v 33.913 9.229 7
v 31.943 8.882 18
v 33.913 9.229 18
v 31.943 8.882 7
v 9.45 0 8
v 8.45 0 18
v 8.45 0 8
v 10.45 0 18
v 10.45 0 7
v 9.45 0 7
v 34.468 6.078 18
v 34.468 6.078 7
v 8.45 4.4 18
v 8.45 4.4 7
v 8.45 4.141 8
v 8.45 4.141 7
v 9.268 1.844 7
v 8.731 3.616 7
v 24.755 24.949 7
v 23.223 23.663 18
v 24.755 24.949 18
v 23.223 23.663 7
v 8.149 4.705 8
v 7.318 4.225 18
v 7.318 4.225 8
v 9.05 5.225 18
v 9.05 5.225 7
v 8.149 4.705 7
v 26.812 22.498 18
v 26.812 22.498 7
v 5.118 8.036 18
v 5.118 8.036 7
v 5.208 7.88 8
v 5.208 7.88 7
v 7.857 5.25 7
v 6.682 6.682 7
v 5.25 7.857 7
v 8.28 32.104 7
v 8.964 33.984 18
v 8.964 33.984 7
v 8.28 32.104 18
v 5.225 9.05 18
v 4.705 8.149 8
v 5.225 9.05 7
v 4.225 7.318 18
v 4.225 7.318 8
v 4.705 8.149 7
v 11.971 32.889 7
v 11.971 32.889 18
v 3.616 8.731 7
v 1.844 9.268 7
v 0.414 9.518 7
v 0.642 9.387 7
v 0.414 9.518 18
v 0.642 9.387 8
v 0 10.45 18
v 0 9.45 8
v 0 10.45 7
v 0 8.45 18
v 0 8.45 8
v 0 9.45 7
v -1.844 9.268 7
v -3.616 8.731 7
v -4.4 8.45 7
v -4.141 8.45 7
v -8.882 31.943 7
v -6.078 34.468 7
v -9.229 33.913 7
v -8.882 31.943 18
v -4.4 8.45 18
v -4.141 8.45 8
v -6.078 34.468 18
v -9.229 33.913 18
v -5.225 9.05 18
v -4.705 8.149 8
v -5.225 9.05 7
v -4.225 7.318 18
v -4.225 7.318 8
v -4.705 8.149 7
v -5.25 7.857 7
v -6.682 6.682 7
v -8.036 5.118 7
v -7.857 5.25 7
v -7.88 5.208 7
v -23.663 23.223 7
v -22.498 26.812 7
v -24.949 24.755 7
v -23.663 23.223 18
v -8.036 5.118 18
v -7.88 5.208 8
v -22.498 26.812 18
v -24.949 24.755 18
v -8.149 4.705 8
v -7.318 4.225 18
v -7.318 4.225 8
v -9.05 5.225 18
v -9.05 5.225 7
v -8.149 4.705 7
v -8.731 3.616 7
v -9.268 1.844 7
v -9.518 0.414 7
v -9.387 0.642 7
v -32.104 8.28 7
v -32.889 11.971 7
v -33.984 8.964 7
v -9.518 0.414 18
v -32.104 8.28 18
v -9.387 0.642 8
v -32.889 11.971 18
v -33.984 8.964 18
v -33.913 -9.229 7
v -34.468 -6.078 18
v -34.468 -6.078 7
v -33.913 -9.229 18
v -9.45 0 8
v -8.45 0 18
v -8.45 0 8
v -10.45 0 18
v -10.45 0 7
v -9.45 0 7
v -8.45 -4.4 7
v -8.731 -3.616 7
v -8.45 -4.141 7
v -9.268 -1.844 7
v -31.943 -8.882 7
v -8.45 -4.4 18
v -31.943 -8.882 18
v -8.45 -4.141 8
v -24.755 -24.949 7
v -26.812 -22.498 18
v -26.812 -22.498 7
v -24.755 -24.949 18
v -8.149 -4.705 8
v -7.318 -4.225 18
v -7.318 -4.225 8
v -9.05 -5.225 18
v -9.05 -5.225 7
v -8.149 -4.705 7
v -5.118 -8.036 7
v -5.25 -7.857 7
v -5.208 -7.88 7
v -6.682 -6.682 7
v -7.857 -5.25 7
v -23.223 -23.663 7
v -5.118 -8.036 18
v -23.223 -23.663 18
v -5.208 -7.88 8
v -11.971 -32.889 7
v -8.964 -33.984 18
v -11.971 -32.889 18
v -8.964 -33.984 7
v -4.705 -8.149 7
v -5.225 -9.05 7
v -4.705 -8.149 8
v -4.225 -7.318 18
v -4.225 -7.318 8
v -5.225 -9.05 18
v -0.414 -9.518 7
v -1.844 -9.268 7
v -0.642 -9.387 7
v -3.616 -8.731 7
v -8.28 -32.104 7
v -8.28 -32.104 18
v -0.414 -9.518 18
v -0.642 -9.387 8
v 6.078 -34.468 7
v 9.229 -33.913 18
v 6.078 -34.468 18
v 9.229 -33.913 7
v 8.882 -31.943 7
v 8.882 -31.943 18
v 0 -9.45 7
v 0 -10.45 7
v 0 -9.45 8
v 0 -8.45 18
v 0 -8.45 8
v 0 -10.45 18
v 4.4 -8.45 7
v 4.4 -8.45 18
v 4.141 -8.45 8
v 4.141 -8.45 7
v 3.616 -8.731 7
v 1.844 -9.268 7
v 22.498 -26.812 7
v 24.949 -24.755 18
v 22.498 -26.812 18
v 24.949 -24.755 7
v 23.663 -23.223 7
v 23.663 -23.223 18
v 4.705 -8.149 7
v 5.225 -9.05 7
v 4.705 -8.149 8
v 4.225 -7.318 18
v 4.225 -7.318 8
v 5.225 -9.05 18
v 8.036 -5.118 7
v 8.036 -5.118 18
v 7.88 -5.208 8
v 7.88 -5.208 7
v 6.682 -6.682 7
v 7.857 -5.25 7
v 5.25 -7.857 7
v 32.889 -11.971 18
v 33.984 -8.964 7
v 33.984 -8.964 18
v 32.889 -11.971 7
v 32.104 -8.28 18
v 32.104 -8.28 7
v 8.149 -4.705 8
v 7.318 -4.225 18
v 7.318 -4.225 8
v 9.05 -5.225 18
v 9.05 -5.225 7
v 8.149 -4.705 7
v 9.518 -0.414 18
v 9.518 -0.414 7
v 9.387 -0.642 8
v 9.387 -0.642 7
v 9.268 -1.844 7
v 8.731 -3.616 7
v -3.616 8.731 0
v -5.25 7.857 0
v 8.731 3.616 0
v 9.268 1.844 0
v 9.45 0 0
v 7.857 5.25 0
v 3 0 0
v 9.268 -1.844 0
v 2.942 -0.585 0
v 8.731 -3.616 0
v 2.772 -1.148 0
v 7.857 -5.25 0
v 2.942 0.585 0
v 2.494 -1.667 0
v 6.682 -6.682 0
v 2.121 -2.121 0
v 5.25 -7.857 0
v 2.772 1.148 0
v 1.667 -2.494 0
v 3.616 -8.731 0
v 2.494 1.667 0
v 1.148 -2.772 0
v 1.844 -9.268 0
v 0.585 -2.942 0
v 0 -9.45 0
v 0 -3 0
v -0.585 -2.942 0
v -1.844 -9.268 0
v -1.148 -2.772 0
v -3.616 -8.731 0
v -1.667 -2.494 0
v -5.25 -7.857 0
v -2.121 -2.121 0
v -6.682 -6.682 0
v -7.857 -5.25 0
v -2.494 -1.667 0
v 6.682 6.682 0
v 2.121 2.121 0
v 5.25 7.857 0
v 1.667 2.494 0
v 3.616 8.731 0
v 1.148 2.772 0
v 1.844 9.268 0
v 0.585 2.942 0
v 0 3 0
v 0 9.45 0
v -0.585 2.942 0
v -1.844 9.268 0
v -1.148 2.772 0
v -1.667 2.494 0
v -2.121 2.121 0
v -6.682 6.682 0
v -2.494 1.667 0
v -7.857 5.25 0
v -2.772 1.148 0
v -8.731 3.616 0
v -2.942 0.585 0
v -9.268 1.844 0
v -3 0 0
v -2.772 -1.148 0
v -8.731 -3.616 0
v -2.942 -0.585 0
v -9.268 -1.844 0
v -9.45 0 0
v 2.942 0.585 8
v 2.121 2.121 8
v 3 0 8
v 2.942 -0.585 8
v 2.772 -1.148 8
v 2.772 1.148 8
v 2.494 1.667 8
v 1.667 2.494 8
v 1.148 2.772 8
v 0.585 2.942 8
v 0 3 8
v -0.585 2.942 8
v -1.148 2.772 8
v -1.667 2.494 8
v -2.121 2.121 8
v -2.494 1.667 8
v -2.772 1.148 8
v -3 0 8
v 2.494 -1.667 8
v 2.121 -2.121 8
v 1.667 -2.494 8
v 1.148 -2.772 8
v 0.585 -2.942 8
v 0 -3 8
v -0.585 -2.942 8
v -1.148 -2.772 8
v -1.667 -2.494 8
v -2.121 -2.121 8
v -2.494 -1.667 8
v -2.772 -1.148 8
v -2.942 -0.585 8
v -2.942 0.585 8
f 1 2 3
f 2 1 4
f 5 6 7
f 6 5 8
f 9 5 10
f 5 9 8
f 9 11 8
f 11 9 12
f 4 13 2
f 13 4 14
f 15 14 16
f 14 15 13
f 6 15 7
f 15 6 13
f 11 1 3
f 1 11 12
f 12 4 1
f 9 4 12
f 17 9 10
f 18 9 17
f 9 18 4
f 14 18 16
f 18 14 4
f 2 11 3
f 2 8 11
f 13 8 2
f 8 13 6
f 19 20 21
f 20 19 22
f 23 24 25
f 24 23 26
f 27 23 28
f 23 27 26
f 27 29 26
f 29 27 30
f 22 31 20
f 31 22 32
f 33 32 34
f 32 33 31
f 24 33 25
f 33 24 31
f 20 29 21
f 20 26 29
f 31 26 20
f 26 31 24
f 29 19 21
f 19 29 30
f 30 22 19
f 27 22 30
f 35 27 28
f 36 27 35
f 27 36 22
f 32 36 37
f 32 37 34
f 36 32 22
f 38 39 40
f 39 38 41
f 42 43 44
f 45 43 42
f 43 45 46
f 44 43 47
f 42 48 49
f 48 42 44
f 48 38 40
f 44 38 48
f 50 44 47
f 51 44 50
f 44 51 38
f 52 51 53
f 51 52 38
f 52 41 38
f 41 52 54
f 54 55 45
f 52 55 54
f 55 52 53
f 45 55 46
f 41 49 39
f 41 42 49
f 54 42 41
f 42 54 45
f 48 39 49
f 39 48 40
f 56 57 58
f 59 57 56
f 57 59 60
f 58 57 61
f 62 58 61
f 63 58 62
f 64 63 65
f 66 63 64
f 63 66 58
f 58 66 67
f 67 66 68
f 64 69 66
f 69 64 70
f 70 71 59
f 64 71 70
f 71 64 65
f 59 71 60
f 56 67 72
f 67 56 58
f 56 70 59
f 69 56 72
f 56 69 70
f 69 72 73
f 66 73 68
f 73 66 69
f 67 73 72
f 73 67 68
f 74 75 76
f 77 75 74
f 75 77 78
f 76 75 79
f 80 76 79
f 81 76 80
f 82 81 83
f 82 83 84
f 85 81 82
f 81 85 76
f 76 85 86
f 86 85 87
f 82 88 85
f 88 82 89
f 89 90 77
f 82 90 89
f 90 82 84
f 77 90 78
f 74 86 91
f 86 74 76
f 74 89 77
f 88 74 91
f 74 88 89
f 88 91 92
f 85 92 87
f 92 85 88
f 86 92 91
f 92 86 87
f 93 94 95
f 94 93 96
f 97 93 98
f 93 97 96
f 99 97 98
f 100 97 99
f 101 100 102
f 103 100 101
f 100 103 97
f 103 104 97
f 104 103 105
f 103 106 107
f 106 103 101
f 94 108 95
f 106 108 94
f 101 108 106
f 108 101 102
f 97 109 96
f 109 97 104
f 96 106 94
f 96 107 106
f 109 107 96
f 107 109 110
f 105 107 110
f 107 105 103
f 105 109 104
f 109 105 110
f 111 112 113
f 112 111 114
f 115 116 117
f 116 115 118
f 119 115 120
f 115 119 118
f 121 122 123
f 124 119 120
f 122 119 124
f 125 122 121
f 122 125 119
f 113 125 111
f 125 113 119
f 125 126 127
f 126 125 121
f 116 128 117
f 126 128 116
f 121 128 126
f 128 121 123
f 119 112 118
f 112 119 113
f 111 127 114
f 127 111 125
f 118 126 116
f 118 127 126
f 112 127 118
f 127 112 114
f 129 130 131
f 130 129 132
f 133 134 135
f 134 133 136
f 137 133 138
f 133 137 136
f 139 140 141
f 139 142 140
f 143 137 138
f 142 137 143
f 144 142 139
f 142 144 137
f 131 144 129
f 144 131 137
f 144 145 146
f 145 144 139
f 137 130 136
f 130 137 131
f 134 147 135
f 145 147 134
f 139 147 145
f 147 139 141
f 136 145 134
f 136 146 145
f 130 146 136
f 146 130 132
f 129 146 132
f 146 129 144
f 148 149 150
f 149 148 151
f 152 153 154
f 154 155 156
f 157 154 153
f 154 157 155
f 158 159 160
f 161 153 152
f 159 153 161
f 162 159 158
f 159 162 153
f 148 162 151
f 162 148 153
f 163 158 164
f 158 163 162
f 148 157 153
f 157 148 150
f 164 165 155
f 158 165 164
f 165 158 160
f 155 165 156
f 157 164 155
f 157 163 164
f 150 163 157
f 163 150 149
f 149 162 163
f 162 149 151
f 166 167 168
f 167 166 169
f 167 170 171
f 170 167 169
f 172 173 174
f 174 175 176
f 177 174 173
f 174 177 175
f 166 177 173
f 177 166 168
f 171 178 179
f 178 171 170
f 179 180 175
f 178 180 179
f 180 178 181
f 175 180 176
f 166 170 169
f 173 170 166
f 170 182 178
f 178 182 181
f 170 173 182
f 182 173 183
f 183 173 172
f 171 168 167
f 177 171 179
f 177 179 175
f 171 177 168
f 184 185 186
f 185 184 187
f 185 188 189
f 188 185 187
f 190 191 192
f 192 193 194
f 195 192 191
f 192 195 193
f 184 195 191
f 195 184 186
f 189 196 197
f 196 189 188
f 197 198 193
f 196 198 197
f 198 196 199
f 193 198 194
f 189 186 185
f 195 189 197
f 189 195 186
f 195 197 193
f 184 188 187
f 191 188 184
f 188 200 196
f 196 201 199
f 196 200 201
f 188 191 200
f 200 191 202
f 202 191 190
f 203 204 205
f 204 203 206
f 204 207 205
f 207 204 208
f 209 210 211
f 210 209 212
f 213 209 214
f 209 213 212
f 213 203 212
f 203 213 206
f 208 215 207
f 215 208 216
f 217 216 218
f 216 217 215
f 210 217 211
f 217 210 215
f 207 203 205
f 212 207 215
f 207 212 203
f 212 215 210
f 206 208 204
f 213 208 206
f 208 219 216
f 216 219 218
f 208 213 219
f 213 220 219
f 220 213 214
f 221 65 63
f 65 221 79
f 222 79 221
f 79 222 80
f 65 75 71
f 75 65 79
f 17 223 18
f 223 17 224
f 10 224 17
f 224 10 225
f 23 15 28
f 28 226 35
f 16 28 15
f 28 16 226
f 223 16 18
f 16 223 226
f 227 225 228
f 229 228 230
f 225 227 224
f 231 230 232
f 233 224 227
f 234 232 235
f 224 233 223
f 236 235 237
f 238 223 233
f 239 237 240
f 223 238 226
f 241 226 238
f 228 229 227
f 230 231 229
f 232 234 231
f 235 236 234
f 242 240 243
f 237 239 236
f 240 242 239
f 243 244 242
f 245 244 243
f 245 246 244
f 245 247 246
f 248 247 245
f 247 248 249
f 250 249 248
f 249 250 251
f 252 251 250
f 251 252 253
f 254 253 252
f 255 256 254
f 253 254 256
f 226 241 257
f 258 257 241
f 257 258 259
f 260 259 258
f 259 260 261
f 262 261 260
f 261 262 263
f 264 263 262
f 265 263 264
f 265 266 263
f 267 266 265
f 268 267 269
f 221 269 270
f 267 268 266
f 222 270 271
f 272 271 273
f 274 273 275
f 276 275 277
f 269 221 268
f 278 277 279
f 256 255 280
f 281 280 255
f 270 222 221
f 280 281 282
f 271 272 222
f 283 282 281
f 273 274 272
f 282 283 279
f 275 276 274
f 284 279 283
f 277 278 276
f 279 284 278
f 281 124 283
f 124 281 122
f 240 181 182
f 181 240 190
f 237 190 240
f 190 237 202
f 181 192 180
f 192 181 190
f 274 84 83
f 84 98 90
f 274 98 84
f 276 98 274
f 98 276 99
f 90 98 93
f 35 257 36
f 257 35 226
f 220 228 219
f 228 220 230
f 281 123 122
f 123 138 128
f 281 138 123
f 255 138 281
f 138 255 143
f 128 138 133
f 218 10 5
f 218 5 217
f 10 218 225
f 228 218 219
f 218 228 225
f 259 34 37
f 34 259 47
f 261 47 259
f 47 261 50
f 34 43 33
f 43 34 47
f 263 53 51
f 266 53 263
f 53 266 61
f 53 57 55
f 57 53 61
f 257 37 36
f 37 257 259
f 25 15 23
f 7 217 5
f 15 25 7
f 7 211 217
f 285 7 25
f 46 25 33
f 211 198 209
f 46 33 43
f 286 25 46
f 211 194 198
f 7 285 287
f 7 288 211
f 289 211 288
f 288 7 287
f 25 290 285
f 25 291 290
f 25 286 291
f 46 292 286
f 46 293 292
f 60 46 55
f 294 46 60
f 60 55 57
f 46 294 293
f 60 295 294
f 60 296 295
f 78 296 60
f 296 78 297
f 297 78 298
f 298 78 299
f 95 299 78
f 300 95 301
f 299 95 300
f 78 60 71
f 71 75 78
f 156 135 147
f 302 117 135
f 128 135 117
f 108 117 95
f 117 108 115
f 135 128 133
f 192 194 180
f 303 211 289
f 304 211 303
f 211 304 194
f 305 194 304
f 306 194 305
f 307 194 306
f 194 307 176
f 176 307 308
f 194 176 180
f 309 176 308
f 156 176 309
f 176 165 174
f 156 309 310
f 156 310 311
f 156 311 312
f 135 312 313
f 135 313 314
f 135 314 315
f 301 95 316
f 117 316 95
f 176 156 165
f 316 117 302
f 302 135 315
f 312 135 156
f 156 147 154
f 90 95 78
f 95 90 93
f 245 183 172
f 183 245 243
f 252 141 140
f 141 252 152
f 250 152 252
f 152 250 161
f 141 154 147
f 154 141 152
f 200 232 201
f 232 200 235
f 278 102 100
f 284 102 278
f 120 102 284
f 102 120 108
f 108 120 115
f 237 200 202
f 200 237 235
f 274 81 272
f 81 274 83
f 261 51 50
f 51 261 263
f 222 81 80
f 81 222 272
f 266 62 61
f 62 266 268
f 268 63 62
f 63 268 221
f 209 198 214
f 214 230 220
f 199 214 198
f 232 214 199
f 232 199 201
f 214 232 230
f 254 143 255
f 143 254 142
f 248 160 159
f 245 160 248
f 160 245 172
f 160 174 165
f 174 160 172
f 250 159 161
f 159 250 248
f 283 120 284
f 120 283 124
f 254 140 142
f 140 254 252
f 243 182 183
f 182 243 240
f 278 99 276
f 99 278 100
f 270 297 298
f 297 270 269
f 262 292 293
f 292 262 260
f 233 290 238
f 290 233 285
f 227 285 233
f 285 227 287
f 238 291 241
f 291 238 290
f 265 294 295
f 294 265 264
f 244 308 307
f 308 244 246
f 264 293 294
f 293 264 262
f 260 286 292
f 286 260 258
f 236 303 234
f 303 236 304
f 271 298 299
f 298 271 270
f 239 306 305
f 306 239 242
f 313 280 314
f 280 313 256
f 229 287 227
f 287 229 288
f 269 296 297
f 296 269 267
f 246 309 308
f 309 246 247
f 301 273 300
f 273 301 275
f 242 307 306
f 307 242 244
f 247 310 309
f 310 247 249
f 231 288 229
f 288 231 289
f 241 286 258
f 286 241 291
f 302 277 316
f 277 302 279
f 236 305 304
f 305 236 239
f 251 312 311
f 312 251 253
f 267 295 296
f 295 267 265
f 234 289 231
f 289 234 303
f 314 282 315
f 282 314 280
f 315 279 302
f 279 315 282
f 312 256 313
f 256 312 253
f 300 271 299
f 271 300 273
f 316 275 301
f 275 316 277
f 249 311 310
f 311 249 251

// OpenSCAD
$fn = 32;

// ----------------------------------------------------------------------
// Impeller: 70 mm, 12 blades, 18 mm tall
// ----------------------------------------------------------------------

// --- parameters (mm) ---
hub_d = 18.9;             // hub diameter
hub_h = 8;                // hub height
imp_d = 70;               // outer diameter over the blades
blades = 12;              // number of blades
blade_t = 2;              // blade thickness
blade_h = 10;             // blade height
blade_in_r = 8.45;        // blade root radius
blade_out_r = 33;         // blade tip radius
sweep = 10;               // blade sweep, degrees
bore_d = 6;               // shaft bore

module hub() {
  cylinder(h = hub_h, d = hub_d);
}

module blade() {
  /* blade swept between two boxes: hull of the root and the tip section */
  hull() {
    translate([blade_in_r, 0, hub_h - 1])
      cube([blade_t, blade_t * 2.2, blade_h + 1], center = false);
    rotate([0, 0, sweep])
      translate([blade_out_r, 0, hub_h - 1])
        cube([blade_t, blade_t * 1.6, blade_h + 1], center = false);
  }
}

module blades() {
  for (i = [0 : blades - 1])
    rotate([0, 0, i * 360 / blades]) blade();
}

difference() {
  union() {
    hub();
    blades();
  }
  translate([0, 0, -1]) cylinder(h = hub_h + blade_h + 0 + 3, d = bore_d);
}
